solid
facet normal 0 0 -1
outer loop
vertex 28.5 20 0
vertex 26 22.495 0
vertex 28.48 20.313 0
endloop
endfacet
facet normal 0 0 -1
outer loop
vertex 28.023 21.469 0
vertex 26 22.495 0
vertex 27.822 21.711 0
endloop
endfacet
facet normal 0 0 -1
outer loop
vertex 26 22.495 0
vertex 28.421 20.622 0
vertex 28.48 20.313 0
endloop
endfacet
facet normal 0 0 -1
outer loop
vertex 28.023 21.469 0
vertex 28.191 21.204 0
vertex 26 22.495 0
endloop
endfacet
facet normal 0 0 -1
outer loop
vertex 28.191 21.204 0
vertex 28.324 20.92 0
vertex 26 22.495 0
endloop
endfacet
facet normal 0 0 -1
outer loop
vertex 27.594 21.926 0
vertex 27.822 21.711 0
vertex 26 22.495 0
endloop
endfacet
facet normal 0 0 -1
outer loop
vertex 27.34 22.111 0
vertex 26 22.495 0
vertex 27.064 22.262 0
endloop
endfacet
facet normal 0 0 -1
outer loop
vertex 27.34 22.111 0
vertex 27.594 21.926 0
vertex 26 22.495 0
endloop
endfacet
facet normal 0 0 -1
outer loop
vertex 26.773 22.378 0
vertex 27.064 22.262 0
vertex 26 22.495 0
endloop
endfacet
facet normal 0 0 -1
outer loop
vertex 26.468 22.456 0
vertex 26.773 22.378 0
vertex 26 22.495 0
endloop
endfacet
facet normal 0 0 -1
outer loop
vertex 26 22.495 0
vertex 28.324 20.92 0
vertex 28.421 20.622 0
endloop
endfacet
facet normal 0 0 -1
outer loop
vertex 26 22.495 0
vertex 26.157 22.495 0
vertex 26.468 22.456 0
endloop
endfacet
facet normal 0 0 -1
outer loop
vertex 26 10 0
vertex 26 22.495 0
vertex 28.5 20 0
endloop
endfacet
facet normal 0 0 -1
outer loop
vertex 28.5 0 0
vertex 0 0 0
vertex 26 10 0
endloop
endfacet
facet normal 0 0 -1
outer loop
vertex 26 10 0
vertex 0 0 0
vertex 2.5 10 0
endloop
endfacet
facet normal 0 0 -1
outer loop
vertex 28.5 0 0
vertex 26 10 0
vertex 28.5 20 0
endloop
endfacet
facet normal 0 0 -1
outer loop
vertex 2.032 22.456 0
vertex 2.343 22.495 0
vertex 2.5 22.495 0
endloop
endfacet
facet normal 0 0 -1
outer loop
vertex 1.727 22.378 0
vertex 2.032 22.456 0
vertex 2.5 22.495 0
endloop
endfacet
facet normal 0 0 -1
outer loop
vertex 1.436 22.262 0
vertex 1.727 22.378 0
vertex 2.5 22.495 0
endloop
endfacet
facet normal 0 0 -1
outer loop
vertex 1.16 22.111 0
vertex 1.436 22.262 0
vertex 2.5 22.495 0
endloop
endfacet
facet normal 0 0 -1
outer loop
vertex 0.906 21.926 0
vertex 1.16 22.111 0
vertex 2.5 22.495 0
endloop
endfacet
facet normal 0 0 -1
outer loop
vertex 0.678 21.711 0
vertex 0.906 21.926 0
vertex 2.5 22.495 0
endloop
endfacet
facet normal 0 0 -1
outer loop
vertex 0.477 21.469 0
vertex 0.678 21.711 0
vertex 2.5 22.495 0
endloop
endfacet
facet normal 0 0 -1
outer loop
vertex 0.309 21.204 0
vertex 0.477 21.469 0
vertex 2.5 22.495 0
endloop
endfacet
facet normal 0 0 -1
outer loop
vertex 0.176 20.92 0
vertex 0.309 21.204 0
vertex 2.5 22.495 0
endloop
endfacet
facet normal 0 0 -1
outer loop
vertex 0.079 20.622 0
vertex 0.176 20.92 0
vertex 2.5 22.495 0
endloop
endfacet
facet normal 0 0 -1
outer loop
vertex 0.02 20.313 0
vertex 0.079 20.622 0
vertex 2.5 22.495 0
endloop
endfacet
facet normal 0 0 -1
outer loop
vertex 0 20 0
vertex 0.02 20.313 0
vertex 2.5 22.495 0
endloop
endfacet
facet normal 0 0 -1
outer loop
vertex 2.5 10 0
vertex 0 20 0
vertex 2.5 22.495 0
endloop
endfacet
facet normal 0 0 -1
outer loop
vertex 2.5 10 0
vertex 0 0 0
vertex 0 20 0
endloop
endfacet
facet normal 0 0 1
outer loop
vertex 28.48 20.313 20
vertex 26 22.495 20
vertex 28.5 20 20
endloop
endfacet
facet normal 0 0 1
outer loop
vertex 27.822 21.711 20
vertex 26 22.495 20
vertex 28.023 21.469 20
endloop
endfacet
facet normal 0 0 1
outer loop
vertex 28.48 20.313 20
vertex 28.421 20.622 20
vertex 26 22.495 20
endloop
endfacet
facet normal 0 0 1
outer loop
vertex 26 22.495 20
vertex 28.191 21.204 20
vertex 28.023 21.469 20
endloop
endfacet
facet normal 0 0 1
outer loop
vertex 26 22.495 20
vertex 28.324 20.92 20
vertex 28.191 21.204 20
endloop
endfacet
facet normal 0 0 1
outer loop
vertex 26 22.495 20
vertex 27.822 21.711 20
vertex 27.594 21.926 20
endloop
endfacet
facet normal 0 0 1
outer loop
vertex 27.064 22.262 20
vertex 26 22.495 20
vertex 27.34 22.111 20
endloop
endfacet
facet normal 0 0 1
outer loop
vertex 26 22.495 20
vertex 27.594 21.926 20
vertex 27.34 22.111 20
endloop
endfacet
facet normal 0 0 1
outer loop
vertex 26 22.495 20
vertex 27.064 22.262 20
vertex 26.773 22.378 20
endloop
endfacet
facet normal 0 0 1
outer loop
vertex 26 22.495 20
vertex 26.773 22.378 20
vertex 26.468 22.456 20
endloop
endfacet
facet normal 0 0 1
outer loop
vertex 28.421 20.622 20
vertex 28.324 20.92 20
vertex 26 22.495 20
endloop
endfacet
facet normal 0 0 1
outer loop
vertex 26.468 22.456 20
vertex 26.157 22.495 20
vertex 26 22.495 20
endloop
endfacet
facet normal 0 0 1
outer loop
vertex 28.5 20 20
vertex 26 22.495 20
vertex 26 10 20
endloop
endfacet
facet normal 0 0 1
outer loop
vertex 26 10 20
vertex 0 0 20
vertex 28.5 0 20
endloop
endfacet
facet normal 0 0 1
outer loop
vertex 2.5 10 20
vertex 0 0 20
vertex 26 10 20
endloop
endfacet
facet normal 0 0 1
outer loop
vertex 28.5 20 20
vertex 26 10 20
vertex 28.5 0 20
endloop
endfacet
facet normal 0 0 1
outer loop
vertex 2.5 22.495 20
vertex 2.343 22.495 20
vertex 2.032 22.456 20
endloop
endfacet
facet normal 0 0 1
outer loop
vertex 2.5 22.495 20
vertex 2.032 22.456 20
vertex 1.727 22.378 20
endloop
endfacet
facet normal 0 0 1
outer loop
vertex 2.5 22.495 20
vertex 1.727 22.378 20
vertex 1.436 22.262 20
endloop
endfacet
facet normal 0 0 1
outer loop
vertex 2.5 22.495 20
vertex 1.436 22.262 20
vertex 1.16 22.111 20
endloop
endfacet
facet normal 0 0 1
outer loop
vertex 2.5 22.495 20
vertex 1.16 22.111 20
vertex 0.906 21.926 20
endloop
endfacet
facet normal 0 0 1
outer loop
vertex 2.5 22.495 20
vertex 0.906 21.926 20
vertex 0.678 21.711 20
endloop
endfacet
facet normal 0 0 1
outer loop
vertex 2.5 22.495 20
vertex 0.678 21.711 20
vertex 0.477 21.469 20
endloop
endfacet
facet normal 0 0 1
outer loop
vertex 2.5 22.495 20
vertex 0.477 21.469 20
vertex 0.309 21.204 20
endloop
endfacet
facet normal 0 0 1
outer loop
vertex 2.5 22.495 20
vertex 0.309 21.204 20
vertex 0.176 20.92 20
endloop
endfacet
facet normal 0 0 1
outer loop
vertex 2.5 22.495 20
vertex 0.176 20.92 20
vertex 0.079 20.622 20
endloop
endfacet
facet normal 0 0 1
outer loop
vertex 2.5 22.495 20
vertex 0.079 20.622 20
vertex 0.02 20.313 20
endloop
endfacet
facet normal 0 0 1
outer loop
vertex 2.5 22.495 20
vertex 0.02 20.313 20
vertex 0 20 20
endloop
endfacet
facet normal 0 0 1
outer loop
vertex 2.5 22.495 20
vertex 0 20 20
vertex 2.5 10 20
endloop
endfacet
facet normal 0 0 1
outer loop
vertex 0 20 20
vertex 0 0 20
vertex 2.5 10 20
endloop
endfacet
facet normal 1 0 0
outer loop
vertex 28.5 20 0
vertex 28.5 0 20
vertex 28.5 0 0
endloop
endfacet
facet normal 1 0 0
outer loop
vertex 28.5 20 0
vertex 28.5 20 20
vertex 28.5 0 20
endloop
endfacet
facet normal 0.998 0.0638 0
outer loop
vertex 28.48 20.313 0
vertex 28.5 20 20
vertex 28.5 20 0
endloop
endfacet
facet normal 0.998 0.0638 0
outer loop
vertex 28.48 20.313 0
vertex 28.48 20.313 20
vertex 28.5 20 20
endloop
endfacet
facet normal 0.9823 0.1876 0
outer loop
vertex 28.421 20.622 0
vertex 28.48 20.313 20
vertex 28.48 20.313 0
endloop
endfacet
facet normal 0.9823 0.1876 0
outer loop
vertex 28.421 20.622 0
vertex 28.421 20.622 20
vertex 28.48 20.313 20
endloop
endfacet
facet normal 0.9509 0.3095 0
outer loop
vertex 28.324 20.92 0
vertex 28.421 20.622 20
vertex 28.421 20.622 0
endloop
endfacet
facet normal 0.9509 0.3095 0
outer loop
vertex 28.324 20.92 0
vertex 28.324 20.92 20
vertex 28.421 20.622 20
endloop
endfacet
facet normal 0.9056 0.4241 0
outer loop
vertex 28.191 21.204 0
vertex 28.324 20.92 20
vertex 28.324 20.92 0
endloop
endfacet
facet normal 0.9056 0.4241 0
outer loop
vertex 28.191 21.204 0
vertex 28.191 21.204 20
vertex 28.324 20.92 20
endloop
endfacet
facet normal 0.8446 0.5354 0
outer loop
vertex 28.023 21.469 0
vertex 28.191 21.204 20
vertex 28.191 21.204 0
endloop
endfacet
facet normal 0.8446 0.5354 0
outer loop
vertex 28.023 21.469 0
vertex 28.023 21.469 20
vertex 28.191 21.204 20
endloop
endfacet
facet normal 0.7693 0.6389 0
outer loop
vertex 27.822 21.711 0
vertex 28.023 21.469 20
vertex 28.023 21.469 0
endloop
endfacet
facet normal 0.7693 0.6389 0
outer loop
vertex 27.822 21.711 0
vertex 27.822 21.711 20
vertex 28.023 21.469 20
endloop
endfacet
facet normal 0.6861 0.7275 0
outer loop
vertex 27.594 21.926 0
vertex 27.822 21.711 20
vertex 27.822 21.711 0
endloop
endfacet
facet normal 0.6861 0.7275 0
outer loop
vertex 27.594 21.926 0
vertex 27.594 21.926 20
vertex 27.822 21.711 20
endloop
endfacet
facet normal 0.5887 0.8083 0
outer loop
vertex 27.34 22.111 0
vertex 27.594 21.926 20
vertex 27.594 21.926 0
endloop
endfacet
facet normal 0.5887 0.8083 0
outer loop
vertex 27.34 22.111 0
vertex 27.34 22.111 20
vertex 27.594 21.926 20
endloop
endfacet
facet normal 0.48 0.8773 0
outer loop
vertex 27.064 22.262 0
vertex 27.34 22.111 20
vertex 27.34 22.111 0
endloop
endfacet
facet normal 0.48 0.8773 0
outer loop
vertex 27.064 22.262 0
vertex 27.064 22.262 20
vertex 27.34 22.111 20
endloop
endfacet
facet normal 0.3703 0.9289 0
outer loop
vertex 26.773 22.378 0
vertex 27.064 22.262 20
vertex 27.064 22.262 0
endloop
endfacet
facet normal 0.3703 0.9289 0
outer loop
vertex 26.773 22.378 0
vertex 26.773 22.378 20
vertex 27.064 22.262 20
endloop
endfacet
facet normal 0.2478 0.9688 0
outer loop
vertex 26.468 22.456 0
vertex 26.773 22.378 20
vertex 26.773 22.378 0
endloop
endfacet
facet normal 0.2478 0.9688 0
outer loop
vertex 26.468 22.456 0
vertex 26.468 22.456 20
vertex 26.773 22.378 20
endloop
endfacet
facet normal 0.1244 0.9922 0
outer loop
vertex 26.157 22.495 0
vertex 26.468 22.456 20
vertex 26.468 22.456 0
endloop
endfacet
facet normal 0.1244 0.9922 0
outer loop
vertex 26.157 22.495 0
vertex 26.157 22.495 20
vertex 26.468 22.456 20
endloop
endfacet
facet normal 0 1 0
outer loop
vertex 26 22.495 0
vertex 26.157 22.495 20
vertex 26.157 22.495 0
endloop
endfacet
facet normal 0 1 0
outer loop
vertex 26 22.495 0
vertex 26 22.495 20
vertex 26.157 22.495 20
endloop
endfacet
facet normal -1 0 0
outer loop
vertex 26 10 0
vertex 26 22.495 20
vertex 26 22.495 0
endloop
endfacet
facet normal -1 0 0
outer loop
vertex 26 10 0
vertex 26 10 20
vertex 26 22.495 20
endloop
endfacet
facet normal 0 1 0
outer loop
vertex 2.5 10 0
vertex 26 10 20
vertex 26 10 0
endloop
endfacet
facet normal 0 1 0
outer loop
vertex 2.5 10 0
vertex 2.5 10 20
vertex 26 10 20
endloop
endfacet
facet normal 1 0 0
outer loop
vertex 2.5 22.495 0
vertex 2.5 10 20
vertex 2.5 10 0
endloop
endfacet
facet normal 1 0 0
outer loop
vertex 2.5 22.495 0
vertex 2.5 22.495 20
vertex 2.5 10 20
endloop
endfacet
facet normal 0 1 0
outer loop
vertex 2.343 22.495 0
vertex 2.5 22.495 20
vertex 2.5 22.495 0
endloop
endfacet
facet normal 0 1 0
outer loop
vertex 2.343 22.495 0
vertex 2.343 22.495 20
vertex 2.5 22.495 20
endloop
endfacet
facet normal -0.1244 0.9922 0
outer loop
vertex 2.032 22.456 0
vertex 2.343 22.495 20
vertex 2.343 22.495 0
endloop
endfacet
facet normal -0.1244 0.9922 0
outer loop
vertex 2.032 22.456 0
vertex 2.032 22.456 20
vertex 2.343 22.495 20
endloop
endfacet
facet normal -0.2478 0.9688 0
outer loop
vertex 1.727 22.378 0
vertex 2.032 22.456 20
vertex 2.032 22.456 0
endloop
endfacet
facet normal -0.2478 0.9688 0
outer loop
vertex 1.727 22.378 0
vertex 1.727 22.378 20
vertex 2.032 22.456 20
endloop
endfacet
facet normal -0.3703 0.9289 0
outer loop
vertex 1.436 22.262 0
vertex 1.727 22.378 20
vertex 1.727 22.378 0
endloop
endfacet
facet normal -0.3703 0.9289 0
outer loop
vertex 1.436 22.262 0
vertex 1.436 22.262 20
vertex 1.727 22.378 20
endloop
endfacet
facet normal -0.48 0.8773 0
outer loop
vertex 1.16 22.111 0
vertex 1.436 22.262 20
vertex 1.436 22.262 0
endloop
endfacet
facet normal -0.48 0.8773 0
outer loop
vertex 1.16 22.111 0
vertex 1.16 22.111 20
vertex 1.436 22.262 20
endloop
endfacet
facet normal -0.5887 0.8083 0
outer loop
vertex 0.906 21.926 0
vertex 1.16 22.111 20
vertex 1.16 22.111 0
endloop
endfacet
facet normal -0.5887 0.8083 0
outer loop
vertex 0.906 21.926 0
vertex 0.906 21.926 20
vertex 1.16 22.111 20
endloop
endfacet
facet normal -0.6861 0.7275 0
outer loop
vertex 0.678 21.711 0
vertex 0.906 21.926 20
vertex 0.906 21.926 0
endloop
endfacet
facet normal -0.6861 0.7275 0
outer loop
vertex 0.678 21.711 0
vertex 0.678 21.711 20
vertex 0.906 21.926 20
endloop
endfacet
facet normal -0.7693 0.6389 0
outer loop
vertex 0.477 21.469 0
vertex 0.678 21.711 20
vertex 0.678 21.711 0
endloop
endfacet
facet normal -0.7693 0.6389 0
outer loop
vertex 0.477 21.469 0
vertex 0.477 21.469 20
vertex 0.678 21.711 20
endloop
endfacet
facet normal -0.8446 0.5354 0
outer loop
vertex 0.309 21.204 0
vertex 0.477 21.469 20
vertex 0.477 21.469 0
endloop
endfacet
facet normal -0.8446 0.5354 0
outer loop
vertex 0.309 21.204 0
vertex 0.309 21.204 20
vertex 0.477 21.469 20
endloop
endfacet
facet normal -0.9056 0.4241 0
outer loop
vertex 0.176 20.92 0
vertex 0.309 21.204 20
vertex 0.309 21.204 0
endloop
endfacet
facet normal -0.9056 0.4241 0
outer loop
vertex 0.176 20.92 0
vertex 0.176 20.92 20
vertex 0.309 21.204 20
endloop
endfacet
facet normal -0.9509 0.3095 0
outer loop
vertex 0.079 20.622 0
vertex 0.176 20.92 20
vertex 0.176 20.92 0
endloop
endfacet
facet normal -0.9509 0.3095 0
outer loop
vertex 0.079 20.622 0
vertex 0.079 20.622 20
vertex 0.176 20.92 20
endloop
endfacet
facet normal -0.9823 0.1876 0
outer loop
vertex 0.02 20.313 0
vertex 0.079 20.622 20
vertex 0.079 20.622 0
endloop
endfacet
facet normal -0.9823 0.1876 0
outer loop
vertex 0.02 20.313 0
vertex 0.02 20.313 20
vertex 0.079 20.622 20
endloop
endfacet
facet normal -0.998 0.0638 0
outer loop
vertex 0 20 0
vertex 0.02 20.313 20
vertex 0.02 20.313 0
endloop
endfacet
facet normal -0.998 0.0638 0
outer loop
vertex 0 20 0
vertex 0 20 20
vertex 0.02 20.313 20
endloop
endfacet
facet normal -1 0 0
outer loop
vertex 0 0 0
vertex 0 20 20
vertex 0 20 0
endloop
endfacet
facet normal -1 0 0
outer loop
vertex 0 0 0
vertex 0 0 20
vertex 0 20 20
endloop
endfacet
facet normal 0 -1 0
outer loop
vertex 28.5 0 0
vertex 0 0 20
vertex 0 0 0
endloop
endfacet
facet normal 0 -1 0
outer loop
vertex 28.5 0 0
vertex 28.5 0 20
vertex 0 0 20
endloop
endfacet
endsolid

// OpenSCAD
//X1 = 23.5;
//X2 = 2.5;

X1 = 0;
X2 = 2.5;
X3 = 23.5 + 2.5;
X4 = 23.5 + 2 * 2.5;

Y1 = 0;
Y2 = 10;
Y3 = 20;

module corner(){
    intersection(){
        square([2.5,2.5]);
        circle(r=2.5, $fn=50);
    }
}


linear_extrude(height=20)

union(){
    polygon([
        [X1,Y1], [X4,Y1], [X4,Y3], [X3,Y3], [X3,Y2], [X2,Y2],
        [X2,Y2], [X2,Y3], [X1,Y3]
    ]);


    translate([X2,Y3])
    mirror([1,0])
    corner();

    translate([X3,Y3])
    corner();
}
